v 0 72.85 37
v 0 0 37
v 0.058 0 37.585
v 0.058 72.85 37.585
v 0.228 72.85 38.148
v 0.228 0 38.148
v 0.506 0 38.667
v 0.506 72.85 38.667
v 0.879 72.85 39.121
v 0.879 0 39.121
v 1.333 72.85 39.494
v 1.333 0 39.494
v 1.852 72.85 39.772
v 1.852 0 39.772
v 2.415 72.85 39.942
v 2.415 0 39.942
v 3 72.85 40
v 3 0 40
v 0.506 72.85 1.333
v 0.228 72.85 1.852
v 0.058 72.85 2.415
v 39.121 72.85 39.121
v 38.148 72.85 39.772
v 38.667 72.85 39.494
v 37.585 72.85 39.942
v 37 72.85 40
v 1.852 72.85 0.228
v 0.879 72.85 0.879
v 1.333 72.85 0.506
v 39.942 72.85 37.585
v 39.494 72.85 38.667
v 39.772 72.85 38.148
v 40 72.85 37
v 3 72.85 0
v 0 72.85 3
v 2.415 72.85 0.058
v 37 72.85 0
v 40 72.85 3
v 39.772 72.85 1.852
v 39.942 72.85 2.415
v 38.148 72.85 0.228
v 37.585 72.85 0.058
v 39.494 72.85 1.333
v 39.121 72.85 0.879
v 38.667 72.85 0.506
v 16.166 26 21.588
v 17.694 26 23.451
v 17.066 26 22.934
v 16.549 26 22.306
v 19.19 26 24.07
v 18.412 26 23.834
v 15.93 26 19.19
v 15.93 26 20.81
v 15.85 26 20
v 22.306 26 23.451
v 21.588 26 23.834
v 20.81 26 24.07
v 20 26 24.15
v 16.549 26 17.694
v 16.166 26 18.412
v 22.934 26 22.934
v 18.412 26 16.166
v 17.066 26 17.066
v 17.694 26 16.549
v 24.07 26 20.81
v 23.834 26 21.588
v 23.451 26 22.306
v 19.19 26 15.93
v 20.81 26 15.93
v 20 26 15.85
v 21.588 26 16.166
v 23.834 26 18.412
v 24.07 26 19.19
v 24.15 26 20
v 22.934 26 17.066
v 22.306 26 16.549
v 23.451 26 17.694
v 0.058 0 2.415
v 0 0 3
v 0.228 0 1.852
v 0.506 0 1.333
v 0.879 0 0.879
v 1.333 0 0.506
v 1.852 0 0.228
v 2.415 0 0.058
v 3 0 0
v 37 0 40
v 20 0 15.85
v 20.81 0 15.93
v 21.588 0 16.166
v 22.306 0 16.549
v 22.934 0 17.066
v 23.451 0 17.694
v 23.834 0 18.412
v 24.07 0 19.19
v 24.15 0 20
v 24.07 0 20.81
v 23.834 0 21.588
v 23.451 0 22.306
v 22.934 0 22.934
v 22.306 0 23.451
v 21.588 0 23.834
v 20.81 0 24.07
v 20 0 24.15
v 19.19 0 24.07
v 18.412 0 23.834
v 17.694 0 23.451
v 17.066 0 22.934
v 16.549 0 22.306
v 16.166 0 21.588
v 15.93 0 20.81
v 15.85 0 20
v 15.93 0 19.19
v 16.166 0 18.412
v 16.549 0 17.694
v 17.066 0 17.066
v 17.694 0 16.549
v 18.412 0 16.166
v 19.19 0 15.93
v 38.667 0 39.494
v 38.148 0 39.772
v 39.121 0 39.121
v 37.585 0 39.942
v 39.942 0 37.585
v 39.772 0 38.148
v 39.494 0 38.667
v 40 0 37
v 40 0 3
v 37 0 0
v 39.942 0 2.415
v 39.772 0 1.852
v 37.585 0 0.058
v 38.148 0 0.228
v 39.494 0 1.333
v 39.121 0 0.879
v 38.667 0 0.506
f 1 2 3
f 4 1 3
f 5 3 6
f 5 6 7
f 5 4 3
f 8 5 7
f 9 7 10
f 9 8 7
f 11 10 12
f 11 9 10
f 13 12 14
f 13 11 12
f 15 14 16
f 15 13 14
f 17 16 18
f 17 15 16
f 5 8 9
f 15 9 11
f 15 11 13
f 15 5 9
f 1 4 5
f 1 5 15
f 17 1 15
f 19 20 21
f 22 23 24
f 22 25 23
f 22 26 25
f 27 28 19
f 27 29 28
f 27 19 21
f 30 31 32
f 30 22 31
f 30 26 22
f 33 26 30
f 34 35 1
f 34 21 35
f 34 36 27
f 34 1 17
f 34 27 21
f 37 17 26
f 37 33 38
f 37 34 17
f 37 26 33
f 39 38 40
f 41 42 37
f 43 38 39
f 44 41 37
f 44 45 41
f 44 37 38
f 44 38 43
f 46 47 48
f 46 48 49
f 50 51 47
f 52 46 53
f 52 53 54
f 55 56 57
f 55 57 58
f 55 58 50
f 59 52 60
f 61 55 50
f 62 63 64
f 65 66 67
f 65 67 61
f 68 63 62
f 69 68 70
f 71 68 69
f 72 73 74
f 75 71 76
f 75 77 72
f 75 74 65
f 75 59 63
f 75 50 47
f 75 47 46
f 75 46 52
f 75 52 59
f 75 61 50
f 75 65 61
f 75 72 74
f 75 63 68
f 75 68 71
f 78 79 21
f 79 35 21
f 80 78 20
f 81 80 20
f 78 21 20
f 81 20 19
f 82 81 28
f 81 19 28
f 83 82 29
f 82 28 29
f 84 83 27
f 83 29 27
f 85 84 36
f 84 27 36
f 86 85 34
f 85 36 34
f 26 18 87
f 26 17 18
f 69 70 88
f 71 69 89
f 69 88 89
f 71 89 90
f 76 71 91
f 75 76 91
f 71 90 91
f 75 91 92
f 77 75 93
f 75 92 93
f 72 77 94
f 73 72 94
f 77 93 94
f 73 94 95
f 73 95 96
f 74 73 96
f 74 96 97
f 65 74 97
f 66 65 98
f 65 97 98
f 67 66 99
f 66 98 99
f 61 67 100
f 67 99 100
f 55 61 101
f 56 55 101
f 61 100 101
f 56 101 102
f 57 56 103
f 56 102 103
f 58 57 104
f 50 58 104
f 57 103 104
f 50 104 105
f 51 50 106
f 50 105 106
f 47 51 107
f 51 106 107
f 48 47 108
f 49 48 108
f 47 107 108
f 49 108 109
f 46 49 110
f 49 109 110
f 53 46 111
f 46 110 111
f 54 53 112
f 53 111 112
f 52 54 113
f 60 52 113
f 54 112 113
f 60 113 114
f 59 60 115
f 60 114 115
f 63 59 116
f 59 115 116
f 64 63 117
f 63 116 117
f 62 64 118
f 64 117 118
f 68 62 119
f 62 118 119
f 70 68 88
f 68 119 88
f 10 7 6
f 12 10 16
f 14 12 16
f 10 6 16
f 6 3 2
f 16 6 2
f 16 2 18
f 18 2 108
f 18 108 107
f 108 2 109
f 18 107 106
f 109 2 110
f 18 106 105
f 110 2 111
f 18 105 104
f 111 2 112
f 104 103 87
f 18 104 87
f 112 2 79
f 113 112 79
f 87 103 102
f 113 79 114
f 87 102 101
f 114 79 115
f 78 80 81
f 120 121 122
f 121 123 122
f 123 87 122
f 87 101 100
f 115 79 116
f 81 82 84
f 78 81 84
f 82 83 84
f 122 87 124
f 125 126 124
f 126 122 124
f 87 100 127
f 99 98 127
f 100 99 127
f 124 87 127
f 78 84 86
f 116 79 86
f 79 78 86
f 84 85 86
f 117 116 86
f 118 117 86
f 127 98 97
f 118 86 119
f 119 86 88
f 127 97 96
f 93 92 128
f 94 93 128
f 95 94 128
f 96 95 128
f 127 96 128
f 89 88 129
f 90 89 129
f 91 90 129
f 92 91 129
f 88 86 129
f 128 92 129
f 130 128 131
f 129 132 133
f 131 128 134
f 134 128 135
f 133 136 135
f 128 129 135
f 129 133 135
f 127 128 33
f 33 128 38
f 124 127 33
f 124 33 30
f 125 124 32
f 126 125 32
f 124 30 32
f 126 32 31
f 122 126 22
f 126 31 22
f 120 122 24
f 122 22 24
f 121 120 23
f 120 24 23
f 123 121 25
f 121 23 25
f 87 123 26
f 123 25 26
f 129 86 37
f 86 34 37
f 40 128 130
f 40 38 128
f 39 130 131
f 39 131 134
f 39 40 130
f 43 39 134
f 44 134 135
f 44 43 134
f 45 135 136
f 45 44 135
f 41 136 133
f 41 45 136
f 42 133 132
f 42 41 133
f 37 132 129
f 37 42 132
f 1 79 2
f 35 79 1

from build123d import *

# Parameters (mm, degrees)
SKETCH_1_W               = 40
SKETCH_1_H               = 72.85
BLOCKEXTRUDE_DEPTH       = 40
FILLET_2_R               = 3
SKETCH_2_R               = 4.15
MOTOR_SHAFT_SOCKET_DEPTH = 26


with BuildPart() as part:
    # 草图1 → BlockExtrude (new body)
    with BuildSketch(Plane.XY):
        with Locations((20, 36.425)):
            Rectangle(SKETCH_1_W, SKETCH_1_H)
    extrude(amount=BLOCKEXTRUDE_DEPTH)

    # Fillet 2
    fillet_2_edges = [part.edges().sort_by_distance(p)[0] for p in [
        (40, 36.425, 40),
        (0, 36.425, 40),
        (40, 36.425, 0),
        (0, 36.425, 0),
    ]]
    fillet(fillet_2_edges, radius=FILLET_2_R)

    # 草图2 → Motor_shaft_socket (cut)
    with BuildSketch(Plane.XZ):
        with Locations(Location((20, 20, 0), (0, 0, 270))):
            Circle(SKETCH_2_R)
    extrude(amount=-MOTOR_SHAFT_SOCKET_DEPTH, mode=Mode.SUBTRACT)


solid = part.part
